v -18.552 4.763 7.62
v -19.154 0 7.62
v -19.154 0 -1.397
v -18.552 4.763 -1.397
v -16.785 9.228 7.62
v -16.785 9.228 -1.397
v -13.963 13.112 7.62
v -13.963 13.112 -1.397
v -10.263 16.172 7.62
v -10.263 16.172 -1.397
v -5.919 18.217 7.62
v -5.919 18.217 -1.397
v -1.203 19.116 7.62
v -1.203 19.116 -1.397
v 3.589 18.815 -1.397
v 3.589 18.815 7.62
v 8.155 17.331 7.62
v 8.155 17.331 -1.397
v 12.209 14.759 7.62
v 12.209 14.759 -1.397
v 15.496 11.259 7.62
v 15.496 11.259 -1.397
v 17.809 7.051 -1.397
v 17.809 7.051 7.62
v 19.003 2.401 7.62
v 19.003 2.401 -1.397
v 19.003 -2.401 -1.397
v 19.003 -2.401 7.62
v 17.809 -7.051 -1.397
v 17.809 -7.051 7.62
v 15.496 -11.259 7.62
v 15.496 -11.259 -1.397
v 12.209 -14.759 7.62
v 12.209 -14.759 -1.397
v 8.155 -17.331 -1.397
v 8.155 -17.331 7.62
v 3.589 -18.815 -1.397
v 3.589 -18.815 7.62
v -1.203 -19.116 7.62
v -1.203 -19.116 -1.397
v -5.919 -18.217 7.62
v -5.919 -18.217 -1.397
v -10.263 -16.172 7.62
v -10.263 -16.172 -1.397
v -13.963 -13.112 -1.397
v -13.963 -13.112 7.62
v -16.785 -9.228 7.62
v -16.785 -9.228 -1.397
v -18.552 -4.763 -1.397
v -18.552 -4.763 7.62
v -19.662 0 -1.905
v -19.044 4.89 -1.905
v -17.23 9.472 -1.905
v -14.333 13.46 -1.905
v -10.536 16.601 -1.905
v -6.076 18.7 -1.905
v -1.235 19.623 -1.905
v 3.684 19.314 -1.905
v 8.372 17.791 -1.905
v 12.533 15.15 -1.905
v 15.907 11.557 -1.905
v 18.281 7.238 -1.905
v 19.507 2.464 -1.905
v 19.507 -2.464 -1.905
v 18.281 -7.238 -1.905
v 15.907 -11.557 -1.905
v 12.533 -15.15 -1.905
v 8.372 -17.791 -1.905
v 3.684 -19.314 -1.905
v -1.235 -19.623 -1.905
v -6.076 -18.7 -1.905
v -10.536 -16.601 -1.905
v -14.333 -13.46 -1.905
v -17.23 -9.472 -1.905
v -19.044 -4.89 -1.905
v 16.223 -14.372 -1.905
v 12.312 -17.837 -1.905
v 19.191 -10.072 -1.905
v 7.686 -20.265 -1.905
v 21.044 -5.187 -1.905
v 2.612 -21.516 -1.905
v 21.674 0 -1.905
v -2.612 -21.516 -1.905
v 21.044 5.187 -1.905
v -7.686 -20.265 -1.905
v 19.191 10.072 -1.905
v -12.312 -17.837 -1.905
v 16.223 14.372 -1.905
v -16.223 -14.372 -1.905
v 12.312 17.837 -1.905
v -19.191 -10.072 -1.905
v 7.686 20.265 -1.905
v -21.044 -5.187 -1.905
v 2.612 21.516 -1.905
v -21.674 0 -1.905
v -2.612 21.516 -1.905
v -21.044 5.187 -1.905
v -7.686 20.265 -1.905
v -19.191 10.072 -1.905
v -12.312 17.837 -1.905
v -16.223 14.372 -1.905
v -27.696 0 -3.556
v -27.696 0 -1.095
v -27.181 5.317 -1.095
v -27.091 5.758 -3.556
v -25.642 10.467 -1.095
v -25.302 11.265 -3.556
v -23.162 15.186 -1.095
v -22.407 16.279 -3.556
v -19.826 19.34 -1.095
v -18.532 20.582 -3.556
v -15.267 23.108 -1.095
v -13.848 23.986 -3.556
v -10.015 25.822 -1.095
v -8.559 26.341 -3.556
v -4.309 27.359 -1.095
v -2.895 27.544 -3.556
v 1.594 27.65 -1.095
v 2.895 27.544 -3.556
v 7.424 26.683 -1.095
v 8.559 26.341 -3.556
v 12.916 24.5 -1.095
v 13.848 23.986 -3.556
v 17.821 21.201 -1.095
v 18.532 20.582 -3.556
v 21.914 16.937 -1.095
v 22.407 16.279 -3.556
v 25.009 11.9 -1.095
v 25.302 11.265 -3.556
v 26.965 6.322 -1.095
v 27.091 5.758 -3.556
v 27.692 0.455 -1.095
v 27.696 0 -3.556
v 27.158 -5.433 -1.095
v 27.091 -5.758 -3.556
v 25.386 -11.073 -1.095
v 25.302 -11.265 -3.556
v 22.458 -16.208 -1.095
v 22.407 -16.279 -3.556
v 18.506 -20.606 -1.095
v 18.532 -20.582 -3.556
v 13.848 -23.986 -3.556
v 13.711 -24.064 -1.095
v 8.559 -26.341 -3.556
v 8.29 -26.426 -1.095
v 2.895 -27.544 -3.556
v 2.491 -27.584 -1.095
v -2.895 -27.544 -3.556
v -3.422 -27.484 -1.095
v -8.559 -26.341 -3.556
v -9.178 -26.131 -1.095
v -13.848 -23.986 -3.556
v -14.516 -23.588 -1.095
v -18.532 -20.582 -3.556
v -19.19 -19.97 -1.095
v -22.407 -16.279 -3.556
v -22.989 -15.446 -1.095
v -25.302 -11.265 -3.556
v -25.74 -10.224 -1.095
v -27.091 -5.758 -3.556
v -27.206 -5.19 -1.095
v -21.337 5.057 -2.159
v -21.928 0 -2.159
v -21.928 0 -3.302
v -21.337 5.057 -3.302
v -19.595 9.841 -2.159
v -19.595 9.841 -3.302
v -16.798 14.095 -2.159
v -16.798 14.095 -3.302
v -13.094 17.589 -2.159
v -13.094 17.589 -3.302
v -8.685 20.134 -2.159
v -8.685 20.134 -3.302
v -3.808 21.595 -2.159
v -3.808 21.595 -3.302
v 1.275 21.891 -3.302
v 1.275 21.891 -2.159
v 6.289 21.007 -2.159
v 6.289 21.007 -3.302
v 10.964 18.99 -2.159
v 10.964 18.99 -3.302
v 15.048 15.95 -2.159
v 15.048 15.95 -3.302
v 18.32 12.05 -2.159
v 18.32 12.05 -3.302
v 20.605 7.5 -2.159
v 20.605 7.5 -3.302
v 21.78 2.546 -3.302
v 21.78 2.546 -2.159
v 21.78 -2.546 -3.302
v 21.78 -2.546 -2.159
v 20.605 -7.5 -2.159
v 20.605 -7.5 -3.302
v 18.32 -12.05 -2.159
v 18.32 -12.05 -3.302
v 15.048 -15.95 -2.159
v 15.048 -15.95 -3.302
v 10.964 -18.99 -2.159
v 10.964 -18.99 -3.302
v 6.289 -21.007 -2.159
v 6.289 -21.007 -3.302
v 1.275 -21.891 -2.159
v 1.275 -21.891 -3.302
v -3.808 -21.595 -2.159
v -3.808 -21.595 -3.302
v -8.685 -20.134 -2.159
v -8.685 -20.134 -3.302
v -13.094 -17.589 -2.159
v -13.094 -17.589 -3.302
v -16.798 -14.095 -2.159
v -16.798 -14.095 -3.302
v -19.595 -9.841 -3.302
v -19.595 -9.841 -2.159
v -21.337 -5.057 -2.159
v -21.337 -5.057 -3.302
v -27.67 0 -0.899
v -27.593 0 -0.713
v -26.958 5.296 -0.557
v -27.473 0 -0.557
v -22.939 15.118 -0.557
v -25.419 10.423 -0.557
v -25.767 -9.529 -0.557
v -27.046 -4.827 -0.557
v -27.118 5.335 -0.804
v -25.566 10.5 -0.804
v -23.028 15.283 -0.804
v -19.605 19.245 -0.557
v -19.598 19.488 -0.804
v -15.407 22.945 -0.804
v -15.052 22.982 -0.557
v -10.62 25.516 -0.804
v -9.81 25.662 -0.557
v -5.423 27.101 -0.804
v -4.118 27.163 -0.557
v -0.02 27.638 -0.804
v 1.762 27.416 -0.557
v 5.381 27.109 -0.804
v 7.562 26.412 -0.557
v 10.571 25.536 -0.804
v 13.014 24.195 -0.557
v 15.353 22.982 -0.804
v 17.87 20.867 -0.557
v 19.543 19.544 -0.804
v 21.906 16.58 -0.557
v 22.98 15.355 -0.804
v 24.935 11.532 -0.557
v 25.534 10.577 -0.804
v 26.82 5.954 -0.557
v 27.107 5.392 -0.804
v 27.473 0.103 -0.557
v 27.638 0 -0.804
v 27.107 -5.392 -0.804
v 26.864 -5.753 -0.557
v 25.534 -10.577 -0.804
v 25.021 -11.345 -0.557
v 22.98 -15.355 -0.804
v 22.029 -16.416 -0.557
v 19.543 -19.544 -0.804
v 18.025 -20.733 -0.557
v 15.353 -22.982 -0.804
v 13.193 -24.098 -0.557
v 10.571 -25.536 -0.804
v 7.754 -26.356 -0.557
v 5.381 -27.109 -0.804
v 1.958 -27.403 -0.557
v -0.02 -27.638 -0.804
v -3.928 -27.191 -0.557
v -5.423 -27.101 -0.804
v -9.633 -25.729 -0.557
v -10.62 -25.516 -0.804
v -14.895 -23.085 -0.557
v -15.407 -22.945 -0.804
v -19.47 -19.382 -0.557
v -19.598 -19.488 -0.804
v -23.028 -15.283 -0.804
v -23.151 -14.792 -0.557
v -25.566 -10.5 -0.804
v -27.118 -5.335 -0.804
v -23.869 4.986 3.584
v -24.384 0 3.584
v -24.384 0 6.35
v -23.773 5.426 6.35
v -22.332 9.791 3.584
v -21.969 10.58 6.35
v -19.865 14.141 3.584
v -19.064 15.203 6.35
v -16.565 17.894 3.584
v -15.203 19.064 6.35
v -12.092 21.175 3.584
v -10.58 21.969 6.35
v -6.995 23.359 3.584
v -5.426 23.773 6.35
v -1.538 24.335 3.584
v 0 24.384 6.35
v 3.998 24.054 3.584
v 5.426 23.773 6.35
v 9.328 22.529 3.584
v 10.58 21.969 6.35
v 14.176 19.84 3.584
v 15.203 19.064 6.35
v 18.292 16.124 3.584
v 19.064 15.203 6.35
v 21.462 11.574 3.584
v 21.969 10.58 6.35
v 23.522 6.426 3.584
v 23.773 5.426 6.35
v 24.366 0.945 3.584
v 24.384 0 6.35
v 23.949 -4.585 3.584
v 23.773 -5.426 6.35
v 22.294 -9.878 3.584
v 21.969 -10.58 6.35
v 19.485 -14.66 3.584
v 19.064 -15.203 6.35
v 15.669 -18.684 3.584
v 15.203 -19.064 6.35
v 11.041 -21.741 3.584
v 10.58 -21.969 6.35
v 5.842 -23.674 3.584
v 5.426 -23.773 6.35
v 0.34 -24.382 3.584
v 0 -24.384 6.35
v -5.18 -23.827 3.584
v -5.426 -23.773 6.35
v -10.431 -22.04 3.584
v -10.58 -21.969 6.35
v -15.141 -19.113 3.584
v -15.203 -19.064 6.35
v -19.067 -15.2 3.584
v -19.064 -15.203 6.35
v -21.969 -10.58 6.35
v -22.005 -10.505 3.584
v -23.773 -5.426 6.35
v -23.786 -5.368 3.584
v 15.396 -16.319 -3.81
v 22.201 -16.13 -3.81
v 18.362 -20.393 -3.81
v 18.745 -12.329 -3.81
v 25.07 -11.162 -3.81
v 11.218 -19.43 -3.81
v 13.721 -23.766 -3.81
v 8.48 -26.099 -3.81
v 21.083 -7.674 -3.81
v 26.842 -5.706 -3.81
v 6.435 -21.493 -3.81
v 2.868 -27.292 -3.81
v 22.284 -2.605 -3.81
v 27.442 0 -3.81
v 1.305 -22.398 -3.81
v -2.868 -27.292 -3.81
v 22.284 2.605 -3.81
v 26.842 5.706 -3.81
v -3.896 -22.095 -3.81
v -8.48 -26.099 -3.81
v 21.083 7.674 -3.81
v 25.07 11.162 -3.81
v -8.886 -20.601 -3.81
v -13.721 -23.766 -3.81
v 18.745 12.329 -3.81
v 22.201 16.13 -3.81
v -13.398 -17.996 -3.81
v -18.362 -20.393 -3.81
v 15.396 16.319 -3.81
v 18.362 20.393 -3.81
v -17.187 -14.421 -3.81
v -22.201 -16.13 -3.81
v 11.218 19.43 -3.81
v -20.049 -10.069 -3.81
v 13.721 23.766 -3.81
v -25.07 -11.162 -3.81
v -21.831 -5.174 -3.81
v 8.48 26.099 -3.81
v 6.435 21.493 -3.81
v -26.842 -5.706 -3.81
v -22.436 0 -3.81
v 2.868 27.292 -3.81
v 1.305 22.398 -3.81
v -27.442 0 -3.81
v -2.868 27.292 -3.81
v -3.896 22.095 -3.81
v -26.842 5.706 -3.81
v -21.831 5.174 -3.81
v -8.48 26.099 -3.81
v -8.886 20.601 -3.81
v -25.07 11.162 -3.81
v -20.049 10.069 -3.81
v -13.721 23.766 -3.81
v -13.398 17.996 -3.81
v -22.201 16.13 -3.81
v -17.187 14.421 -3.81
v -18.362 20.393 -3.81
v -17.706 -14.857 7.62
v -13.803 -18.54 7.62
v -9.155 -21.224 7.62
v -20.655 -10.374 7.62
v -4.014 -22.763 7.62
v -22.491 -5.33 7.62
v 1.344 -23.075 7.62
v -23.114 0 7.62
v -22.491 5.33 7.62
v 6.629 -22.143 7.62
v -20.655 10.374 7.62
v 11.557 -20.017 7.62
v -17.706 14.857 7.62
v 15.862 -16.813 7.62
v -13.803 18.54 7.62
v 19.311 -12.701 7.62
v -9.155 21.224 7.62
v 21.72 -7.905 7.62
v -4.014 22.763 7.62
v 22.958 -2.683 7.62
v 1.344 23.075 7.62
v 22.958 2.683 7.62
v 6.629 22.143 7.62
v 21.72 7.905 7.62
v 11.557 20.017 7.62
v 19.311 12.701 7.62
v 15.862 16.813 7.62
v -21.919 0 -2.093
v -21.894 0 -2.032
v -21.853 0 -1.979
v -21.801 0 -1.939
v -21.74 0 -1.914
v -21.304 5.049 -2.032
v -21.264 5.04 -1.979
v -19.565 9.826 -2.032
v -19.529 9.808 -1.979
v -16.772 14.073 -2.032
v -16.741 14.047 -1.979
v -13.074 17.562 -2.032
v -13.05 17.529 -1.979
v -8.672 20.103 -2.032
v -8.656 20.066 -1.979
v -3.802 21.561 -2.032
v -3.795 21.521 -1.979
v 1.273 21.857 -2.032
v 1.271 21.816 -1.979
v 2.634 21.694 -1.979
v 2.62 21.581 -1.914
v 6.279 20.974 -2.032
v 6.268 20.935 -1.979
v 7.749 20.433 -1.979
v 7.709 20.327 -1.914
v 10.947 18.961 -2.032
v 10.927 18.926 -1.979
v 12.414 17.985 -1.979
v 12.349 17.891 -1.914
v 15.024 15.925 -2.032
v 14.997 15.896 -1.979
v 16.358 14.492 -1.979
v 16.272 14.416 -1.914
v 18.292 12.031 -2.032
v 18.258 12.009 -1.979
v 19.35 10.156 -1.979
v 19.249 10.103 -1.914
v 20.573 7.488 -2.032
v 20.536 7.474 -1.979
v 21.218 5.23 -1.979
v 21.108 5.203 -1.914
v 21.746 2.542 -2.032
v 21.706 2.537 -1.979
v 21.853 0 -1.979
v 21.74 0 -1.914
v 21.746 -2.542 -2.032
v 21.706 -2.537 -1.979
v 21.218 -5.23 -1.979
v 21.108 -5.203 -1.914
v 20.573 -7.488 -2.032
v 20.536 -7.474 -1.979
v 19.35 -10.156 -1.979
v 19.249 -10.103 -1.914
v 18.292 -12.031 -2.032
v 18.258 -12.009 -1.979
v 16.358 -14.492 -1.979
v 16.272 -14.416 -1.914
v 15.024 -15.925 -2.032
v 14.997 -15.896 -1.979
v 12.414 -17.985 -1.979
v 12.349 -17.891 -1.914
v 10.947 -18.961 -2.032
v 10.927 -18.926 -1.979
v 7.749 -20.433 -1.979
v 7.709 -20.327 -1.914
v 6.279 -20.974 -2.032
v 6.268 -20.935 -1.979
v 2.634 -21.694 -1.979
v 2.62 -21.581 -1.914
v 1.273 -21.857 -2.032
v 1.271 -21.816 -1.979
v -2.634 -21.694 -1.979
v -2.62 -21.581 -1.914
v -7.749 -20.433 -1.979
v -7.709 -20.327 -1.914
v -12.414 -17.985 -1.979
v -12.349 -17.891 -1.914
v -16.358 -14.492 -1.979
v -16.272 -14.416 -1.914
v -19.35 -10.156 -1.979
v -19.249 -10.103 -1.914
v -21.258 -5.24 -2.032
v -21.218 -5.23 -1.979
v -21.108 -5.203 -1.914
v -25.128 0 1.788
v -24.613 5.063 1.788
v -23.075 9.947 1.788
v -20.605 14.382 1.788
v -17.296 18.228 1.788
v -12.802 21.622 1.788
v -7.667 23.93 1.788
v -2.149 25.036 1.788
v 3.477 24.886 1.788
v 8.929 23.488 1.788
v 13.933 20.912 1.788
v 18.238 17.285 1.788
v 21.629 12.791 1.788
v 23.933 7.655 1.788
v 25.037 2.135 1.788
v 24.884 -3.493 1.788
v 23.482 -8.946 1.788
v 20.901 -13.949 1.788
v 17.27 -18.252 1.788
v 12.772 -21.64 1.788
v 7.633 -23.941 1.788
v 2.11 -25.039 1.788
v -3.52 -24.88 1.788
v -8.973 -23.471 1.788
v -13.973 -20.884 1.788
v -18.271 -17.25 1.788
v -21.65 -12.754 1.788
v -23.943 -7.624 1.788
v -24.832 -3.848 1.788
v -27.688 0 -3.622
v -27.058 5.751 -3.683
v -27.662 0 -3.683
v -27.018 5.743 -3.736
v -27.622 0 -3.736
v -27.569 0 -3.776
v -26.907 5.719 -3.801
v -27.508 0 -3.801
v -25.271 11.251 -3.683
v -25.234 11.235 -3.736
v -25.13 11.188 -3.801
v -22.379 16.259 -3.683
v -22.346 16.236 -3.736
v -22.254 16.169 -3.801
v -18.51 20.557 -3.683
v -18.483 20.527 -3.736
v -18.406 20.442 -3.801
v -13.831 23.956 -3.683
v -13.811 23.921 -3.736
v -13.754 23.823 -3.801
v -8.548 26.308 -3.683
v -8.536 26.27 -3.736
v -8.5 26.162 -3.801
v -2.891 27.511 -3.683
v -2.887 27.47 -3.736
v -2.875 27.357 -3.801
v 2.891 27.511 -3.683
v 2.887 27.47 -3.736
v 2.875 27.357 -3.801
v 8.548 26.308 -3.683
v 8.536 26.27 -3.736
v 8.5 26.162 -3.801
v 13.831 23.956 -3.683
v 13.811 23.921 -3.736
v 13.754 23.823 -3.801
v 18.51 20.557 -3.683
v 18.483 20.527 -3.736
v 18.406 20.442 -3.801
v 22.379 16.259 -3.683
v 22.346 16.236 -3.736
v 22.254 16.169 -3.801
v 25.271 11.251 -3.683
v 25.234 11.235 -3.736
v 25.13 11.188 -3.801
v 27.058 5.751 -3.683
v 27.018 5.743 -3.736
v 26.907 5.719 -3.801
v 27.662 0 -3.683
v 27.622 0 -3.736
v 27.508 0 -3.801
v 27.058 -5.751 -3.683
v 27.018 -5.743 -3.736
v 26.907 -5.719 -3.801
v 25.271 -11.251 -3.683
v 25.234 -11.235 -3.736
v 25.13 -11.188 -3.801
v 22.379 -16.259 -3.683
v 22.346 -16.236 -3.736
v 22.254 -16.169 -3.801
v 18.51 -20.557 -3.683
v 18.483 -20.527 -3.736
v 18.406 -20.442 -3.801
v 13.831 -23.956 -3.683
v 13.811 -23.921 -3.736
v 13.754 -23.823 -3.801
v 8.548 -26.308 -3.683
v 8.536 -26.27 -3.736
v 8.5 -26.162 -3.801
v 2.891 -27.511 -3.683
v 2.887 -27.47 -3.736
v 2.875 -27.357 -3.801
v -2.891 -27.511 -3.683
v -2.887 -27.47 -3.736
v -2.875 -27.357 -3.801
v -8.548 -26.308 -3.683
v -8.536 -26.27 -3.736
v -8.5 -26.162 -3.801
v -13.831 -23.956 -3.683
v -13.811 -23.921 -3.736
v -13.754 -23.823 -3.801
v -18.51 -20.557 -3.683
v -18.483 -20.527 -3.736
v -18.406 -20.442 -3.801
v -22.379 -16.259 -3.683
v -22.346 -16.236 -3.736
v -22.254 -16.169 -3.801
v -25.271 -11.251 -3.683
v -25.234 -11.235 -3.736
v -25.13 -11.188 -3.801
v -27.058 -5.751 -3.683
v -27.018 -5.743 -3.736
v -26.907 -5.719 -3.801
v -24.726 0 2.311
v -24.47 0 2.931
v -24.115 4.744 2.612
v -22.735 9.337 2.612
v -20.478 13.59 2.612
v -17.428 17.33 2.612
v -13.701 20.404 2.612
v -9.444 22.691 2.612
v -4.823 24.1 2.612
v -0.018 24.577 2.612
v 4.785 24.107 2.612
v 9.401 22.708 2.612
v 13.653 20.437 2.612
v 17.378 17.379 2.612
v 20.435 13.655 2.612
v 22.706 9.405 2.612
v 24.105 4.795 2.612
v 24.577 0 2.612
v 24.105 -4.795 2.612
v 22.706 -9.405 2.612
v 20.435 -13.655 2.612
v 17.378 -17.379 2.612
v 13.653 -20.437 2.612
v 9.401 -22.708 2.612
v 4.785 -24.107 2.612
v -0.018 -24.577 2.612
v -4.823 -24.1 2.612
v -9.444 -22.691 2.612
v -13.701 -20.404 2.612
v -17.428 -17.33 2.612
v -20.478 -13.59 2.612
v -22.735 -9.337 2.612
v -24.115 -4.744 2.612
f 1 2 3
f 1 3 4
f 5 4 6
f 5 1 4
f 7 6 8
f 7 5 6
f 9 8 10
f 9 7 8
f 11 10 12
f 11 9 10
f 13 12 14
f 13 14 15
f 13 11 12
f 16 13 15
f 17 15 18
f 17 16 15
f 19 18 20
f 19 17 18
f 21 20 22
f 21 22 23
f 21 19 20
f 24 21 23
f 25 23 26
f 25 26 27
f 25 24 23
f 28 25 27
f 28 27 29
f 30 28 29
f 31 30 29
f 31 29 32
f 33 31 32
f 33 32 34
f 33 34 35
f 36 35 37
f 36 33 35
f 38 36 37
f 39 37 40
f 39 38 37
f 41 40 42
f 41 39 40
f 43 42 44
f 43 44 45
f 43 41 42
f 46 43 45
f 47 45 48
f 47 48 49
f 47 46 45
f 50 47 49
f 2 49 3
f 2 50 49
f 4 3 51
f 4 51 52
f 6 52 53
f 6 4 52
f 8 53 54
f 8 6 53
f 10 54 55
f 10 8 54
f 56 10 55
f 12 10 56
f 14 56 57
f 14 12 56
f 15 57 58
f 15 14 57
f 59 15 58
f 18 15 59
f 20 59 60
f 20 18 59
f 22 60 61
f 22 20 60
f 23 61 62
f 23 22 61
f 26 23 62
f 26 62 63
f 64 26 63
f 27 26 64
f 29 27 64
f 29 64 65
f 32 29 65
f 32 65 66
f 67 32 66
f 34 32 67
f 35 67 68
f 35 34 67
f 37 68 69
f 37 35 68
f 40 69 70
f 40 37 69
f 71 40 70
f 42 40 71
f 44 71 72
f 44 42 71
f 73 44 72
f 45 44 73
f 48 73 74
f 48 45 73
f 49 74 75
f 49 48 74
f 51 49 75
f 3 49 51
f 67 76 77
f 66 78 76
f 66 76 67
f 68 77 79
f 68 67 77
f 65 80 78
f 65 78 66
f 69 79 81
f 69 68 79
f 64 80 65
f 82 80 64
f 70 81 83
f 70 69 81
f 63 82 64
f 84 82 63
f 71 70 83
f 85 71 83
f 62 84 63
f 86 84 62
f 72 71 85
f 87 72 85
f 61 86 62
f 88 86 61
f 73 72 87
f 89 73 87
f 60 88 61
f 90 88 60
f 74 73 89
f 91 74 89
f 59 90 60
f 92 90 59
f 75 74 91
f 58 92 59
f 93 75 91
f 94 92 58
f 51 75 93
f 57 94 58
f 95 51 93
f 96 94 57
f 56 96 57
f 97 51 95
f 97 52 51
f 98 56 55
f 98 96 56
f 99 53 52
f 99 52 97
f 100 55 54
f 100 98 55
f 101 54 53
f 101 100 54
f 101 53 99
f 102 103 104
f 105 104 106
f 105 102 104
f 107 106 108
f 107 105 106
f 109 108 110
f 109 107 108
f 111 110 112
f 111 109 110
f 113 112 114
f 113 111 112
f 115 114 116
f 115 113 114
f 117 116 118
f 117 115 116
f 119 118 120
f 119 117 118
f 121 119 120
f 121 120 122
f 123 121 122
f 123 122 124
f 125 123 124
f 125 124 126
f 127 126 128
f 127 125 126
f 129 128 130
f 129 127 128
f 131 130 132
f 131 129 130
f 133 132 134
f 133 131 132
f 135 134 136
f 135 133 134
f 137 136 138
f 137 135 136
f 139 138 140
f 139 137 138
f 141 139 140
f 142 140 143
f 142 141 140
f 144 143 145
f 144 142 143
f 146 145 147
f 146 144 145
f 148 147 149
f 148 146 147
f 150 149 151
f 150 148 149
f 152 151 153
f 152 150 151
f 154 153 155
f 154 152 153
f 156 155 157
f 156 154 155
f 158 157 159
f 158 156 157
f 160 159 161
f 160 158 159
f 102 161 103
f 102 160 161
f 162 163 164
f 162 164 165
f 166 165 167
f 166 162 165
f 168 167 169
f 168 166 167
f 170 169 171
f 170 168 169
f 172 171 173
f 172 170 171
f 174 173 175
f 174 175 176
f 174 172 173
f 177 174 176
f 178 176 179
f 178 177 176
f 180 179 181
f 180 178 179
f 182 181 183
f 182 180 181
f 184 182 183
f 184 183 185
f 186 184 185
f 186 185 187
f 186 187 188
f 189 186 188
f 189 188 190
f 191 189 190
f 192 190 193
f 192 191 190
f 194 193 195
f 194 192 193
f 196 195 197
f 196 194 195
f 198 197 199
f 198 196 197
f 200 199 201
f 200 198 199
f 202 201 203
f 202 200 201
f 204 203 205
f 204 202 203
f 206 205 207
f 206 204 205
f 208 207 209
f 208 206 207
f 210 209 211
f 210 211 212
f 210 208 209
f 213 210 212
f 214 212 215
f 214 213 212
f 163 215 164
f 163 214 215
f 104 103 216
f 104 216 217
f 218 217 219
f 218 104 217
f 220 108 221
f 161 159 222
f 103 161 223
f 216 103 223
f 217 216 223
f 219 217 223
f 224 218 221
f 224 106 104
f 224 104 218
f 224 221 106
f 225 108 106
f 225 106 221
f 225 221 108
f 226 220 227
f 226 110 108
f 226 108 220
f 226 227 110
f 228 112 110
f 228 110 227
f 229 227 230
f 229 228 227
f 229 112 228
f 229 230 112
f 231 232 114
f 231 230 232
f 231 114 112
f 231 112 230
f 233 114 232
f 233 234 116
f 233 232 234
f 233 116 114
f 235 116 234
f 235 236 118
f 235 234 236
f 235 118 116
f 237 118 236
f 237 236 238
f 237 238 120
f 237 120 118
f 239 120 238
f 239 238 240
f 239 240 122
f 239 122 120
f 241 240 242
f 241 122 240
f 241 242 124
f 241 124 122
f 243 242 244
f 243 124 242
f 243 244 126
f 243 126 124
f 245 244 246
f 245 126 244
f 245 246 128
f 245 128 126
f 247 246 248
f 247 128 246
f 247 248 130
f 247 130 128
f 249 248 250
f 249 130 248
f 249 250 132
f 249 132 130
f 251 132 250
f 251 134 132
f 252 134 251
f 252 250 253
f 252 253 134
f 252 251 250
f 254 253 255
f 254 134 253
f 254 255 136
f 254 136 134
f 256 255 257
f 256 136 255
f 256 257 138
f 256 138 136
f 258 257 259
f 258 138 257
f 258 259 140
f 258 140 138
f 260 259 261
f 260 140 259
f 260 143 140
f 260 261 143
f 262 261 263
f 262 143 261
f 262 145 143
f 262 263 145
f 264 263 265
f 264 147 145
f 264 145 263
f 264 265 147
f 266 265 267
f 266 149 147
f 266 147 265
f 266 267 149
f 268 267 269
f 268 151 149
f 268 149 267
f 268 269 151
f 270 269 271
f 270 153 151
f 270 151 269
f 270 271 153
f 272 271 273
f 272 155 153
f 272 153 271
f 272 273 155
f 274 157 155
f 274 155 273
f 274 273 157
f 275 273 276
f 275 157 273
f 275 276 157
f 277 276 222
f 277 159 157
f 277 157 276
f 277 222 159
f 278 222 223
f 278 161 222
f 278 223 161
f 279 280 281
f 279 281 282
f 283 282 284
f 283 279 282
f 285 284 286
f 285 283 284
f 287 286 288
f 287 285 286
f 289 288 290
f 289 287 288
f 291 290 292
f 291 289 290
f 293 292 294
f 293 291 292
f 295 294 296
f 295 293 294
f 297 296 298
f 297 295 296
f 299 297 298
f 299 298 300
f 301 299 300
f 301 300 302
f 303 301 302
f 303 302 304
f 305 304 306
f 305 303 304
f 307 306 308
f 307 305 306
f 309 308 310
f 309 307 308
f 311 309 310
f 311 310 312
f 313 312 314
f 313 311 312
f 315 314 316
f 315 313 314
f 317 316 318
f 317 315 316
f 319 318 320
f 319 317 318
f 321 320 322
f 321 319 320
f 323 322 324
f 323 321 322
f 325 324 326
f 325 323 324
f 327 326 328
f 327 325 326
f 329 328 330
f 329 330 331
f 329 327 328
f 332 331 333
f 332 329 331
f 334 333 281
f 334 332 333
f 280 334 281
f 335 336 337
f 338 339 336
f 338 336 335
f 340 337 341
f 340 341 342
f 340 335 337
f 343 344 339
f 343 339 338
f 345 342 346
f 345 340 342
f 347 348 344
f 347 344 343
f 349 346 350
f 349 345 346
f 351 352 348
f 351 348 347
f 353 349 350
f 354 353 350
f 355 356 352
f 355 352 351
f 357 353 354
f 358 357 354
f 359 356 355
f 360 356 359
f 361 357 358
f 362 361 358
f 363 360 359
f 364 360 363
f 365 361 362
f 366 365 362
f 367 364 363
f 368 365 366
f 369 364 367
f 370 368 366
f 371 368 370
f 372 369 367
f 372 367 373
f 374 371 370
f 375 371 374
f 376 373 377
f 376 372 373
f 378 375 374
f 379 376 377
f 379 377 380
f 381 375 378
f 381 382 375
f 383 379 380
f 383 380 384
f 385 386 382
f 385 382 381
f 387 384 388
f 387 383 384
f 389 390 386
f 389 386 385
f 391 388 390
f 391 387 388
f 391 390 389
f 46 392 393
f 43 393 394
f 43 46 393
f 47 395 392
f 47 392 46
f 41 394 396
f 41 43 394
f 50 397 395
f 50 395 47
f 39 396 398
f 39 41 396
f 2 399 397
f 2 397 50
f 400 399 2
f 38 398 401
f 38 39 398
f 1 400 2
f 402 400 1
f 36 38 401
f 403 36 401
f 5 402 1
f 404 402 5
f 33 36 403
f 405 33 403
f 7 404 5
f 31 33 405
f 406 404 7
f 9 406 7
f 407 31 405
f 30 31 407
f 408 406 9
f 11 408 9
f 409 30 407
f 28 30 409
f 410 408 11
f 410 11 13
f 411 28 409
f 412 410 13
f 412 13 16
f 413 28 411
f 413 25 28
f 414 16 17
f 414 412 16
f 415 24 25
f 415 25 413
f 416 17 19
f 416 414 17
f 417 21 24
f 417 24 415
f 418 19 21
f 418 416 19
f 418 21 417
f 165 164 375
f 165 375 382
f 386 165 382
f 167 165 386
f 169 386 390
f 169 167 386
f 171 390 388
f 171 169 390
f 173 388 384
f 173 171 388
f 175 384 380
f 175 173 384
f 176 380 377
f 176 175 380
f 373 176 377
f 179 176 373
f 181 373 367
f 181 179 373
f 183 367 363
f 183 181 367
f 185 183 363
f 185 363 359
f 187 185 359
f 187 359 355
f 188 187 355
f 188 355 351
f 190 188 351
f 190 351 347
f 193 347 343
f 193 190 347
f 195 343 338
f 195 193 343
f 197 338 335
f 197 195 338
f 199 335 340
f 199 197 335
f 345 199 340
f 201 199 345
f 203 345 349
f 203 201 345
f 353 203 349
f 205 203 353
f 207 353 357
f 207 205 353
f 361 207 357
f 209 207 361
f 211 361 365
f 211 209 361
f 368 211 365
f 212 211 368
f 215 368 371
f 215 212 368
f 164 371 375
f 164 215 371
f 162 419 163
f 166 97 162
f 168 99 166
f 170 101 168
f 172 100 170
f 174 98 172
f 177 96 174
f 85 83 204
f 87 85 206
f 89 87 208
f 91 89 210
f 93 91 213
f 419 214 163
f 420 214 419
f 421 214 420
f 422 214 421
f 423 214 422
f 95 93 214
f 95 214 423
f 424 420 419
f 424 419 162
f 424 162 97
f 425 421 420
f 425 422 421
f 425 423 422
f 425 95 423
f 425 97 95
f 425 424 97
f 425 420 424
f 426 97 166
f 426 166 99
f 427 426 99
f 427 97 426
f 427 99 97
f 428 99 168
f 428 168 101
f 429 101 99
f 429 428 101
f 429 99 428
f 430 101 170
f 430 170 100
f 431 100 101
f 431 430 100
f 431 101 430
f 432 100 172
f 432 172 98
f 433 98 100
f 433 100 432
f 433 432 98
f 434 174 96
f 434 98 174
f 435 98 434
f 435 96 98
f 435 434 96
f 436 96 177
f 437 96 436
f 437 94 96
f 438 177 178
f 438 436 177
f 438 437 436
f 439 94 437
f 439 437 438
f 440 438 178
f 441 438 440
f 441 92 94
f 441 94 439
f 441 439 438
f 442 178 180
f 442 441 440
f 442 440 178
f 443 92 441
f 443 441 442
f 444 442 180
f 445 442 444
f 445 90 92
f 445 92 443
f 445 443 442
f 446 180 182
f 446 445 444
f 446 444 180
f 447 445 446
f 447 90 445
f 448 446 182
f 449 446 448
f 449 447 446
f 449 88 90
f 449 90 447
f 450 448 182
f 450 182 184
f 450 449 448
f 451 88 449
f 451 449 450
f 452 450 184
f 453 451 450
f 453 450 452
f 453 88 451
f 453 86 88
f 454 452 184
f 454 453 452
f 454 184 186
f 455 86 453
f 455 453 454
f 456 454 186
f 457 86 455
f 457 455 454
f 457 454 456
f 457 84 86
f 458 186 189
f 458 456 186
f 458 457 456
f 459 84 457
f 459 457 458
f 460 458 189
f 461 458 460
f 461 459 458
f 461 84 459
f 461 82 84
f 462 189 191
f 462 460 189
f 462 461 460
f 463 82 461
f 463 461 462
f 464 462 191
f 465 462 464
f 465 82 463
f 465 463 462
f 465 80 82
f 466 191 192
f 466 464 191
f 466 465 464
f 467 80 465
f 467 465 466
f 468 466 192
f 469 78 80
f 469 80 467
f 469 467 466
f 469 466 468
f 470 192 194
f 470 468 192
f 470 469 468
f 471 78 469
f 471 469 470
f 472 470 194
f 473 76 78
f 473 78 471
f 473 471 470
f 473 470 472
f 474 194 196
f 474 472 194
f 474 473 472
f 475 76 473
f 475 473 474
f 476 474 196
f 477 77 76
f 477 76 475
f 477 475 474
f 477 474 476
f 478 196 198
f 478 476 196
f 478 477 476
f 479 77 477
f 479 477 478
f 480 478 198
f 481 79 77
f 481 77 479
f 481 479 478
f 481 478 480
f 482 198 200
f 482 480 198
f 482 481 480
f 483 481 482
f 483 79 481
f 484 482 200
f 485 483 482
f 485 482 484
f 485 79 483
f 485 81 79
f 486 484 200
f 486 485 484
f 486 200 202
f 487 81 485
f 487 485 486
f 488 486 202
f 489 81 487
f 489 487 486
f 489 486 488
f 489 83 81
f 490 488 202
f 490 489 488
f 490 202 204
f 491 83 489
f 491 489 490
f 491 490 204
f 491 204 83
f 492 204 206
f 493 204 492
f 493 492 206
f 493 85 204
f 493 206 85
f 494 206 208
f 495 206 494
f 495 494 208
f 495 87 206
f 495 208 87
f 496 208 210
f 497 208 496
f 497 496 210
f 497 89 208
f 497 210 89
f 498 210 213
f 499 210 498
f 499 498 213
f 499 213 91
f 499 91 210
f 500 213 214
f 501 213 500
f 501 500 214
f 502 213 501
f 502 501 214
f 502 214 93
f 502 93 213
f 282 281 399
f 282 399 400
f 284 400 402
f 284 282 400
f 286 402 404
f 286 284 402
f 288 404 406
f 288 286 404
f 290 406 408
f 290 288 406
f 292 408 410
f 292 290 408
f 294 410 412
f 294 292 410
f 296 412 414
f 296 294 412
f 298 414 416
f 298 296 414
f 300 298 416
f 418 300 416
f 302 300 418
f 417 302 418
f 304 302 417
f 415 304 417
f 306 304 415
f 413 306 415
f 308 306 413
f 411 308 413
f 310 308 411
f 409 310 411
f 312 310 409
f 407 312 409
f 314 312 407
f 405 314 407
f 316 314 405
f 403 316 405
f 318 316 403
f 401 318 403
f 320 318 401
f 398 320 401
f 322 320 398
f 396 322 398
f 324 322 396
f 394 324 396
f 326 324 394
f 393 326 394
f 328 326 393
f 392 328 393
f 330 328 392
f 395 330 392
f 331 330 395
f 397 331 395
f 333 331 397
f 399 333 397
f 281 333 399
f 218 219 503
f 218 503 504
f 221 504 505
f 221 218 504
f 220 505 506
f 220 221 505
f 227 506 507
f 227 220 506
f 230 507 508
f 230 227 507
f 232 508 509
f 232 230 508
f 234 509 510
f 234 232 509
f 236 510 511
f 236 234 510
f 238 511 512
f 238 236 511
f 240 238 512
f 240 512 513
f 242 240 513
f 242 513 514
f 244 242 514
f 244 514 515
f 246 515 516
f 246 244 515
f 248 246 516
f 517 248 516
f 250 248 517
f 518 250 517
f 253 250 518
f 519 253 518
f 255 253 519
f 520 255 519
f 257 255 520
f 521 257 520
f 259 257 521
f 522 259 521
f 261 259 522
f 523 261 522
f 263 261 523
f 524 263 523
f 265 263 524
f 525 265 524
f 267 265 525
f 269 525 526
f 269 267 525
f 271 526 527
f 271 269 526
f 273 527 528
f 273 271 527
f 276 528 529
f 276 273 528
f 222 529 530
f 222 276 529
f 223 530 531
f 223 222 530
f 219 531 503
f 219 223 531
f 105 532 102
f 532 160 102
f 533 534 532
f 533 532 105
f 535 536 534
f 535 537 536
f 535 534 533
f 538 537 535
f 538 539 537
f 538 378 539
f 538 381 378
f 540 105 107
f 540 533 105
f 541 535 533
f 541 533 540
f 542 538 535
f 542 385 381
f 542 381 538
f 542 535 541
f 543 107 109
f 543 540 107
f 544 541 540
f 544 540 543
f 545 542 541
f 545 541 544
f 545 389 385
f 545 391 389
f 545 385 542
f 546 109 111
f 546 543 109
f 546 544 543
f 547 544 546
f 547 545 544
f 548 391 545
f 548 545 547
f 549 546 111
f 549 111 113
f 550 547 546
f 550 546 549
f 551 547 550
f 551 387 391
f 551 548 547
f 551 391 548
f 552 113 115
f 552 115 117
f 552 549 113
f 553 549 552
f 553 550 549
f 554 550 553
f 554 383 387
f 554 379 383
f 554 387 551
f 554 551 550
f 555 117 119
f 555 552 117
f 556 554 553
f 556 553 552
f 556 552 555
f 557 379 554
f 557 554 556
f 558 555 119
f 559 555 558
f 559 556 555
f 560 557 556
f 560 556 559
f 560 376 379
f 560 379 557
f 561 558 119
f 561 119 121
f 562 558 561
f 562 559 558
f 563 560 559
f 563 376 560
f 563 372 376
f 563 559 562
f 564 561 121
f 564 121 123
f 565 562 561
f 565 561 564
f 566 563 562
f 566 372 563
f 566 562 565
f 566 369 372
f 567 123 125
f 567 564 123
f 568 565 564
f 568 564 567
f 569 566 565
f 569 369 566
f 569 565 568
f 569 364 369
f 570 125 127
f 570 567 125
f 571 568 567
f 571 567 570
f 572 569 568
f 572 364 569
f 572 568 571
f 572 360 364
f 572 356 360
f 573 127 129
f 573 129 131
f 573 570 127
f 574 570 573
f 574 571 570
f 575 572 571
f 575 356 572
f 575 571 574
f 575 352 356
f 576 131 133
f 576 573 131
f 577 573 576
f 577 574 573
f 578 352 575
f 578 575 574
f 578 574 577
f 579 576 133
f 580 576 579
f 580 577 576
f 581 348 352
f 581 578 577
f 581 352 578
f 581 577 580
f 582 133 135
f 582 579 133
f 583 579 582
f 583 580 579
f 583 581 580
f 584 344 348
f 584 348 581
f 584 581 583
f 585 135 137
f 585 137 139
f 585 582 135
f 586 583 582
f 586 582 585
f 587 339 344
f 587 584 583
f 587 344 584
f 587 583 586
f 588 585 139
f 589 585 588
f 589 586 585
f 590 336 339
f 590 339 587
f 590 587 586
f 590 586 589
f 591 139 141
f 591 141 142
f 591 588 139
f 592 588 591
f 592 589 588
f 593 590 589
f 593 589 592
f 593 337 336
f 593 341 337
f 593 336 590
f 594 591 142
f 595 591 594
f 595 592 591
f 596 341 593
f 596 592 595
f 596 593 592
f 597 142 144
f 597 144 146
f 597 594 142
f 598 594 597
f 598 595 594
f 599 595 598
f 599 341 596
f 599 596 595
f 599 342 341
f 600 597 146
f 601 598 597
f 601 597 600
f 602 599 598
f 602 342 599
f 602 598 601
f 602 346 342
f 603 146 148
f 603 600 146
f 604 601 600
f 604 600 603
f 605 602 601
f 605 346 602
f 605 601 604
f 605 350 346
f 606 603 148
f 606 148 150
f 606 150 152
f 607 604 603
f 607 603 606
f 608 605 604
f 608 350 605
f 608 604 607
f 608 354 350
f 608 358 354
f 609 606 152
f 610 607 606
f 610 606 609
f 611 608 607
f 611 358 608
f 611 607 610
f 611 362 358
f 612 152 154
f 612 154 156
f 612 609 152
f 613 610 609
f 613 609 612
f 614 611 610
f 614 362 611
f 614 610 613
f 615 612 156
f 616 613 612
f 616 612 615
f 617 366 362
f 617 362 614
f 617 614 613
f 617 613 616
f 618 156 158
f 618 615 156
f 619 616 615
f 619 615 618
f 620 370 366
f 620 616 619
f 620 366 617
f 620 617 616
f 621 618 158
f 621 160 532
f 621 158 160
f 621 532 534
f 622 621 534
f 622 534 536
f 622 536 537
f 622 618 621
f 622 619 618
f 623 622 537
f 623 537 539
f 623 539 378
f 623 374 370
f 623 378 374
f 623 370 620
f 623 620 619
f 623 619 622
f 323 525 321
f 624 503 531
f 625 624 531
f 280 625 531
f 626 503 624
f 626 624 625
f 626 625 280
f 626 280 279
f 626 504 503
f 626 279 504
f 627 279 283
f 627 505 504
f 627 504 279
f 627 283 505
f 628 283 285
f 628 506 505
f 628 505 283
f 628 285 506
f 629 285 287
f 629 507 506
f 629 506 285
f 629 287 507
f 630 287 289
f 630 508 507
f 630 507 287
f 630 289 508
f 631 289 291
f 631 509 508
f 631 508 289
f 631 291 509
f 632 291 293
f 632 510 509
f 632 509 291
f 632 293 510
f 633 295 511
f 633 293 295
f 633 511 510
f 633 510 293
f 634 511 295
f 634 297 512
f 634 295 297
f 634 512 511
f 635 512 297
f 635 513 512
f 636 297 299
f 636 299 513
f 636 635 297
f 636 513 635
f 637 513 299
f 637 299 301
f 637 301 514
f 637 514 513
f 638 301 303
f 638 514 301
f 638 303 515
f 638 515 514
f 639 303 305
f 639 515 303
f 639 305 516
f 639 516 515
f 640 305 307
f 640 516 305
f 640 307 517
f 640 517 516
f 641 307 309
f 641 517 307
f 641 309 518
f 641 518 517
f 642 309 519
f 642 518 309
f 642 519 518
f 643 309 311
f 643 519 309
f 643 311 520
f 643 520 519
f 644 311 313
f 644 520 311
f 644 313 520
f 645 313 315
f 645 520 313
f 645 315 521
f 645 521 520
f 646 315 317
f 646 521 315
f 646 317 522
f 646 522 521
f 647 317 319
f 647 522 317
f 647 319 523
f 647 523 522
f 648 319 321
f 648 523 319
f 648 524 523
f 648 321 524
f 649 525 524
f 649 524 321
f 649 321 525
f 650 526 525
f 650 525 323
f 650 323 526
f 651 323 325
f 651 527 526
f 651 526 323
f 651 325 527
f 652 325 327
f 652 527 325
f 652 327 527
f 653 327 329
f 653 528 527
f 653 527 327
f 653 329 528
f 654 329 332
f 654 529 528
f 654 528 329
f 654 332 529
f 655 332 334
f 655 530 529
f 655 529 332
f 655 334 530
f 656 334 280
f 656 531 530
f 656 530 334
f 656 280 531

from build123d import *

# Parameters (mm, degrees)
F1_R    = 0.762
F2_R    = 2.54
F7_R    = 0.254
F3_SIZE = 0.508
F4_R    = 0.254
F5_SIZE = 1.27


with BuildPart() as f6:
    # F0 (on Front) → F6 (revolve)
    with BuildSketch(Plane.XZ):
        Polygon((-27.69616, -0.77978), (-27.69616, -3.81), (-21.92782, -3.81), (-21.92782, -1.905), (-19.15414, -1.905), (-19.15414, 7.62), (-24.384, 7.62), (-24.384, 2.53238), align=None)
    revolve(axis=Axis((0, 0, 5.998353), (0, 0, -1)))

    # F1
    f1_edges = [f6.edges().sort_by_distance(p)[0] for p in [
        (27.69616, 0, -0.77978),
    ]]
    fillet(f1_edges, radius=F1_R)

    # F2
    f2_edges = [f6.edges().sort_by_distance(p)[0] for p in [
        (24.384, 0, 2.53238),
    ]]
    fillet(f2_edges, radius=F2_R)

    # F7
    f7_edges = [f6.edges().sort_by_distance(p)[0] for p in [
        (27.69616, 0, -3.81),
    ]]
    fillet(f7_edges, radius=F7_R)

    # F3
    f3_edges = [f6.edges().sort_by_distance(p)[0] for p in [
        (21.92782, 0, -3.81),
        (19.15414, 0, -1.905),
    ]]
    chamfer(f3_edges, length=F3_SIZE)

    # F4
    f4_edges = [f6.edges().sort_by_distance(p)[0] for p in [
        (21.92782, 0, -1.905),
    ]]
    fillet(f4_edges, radius=F4_R)

    # F5
    f5_edges = [f6.edges().sort_by_distance(p)[0] for p in [
        (24.384, 0, 7.62),
    ]]
    chamfer(f5_edges, length=F5_SIZE)


solid = f6.part
